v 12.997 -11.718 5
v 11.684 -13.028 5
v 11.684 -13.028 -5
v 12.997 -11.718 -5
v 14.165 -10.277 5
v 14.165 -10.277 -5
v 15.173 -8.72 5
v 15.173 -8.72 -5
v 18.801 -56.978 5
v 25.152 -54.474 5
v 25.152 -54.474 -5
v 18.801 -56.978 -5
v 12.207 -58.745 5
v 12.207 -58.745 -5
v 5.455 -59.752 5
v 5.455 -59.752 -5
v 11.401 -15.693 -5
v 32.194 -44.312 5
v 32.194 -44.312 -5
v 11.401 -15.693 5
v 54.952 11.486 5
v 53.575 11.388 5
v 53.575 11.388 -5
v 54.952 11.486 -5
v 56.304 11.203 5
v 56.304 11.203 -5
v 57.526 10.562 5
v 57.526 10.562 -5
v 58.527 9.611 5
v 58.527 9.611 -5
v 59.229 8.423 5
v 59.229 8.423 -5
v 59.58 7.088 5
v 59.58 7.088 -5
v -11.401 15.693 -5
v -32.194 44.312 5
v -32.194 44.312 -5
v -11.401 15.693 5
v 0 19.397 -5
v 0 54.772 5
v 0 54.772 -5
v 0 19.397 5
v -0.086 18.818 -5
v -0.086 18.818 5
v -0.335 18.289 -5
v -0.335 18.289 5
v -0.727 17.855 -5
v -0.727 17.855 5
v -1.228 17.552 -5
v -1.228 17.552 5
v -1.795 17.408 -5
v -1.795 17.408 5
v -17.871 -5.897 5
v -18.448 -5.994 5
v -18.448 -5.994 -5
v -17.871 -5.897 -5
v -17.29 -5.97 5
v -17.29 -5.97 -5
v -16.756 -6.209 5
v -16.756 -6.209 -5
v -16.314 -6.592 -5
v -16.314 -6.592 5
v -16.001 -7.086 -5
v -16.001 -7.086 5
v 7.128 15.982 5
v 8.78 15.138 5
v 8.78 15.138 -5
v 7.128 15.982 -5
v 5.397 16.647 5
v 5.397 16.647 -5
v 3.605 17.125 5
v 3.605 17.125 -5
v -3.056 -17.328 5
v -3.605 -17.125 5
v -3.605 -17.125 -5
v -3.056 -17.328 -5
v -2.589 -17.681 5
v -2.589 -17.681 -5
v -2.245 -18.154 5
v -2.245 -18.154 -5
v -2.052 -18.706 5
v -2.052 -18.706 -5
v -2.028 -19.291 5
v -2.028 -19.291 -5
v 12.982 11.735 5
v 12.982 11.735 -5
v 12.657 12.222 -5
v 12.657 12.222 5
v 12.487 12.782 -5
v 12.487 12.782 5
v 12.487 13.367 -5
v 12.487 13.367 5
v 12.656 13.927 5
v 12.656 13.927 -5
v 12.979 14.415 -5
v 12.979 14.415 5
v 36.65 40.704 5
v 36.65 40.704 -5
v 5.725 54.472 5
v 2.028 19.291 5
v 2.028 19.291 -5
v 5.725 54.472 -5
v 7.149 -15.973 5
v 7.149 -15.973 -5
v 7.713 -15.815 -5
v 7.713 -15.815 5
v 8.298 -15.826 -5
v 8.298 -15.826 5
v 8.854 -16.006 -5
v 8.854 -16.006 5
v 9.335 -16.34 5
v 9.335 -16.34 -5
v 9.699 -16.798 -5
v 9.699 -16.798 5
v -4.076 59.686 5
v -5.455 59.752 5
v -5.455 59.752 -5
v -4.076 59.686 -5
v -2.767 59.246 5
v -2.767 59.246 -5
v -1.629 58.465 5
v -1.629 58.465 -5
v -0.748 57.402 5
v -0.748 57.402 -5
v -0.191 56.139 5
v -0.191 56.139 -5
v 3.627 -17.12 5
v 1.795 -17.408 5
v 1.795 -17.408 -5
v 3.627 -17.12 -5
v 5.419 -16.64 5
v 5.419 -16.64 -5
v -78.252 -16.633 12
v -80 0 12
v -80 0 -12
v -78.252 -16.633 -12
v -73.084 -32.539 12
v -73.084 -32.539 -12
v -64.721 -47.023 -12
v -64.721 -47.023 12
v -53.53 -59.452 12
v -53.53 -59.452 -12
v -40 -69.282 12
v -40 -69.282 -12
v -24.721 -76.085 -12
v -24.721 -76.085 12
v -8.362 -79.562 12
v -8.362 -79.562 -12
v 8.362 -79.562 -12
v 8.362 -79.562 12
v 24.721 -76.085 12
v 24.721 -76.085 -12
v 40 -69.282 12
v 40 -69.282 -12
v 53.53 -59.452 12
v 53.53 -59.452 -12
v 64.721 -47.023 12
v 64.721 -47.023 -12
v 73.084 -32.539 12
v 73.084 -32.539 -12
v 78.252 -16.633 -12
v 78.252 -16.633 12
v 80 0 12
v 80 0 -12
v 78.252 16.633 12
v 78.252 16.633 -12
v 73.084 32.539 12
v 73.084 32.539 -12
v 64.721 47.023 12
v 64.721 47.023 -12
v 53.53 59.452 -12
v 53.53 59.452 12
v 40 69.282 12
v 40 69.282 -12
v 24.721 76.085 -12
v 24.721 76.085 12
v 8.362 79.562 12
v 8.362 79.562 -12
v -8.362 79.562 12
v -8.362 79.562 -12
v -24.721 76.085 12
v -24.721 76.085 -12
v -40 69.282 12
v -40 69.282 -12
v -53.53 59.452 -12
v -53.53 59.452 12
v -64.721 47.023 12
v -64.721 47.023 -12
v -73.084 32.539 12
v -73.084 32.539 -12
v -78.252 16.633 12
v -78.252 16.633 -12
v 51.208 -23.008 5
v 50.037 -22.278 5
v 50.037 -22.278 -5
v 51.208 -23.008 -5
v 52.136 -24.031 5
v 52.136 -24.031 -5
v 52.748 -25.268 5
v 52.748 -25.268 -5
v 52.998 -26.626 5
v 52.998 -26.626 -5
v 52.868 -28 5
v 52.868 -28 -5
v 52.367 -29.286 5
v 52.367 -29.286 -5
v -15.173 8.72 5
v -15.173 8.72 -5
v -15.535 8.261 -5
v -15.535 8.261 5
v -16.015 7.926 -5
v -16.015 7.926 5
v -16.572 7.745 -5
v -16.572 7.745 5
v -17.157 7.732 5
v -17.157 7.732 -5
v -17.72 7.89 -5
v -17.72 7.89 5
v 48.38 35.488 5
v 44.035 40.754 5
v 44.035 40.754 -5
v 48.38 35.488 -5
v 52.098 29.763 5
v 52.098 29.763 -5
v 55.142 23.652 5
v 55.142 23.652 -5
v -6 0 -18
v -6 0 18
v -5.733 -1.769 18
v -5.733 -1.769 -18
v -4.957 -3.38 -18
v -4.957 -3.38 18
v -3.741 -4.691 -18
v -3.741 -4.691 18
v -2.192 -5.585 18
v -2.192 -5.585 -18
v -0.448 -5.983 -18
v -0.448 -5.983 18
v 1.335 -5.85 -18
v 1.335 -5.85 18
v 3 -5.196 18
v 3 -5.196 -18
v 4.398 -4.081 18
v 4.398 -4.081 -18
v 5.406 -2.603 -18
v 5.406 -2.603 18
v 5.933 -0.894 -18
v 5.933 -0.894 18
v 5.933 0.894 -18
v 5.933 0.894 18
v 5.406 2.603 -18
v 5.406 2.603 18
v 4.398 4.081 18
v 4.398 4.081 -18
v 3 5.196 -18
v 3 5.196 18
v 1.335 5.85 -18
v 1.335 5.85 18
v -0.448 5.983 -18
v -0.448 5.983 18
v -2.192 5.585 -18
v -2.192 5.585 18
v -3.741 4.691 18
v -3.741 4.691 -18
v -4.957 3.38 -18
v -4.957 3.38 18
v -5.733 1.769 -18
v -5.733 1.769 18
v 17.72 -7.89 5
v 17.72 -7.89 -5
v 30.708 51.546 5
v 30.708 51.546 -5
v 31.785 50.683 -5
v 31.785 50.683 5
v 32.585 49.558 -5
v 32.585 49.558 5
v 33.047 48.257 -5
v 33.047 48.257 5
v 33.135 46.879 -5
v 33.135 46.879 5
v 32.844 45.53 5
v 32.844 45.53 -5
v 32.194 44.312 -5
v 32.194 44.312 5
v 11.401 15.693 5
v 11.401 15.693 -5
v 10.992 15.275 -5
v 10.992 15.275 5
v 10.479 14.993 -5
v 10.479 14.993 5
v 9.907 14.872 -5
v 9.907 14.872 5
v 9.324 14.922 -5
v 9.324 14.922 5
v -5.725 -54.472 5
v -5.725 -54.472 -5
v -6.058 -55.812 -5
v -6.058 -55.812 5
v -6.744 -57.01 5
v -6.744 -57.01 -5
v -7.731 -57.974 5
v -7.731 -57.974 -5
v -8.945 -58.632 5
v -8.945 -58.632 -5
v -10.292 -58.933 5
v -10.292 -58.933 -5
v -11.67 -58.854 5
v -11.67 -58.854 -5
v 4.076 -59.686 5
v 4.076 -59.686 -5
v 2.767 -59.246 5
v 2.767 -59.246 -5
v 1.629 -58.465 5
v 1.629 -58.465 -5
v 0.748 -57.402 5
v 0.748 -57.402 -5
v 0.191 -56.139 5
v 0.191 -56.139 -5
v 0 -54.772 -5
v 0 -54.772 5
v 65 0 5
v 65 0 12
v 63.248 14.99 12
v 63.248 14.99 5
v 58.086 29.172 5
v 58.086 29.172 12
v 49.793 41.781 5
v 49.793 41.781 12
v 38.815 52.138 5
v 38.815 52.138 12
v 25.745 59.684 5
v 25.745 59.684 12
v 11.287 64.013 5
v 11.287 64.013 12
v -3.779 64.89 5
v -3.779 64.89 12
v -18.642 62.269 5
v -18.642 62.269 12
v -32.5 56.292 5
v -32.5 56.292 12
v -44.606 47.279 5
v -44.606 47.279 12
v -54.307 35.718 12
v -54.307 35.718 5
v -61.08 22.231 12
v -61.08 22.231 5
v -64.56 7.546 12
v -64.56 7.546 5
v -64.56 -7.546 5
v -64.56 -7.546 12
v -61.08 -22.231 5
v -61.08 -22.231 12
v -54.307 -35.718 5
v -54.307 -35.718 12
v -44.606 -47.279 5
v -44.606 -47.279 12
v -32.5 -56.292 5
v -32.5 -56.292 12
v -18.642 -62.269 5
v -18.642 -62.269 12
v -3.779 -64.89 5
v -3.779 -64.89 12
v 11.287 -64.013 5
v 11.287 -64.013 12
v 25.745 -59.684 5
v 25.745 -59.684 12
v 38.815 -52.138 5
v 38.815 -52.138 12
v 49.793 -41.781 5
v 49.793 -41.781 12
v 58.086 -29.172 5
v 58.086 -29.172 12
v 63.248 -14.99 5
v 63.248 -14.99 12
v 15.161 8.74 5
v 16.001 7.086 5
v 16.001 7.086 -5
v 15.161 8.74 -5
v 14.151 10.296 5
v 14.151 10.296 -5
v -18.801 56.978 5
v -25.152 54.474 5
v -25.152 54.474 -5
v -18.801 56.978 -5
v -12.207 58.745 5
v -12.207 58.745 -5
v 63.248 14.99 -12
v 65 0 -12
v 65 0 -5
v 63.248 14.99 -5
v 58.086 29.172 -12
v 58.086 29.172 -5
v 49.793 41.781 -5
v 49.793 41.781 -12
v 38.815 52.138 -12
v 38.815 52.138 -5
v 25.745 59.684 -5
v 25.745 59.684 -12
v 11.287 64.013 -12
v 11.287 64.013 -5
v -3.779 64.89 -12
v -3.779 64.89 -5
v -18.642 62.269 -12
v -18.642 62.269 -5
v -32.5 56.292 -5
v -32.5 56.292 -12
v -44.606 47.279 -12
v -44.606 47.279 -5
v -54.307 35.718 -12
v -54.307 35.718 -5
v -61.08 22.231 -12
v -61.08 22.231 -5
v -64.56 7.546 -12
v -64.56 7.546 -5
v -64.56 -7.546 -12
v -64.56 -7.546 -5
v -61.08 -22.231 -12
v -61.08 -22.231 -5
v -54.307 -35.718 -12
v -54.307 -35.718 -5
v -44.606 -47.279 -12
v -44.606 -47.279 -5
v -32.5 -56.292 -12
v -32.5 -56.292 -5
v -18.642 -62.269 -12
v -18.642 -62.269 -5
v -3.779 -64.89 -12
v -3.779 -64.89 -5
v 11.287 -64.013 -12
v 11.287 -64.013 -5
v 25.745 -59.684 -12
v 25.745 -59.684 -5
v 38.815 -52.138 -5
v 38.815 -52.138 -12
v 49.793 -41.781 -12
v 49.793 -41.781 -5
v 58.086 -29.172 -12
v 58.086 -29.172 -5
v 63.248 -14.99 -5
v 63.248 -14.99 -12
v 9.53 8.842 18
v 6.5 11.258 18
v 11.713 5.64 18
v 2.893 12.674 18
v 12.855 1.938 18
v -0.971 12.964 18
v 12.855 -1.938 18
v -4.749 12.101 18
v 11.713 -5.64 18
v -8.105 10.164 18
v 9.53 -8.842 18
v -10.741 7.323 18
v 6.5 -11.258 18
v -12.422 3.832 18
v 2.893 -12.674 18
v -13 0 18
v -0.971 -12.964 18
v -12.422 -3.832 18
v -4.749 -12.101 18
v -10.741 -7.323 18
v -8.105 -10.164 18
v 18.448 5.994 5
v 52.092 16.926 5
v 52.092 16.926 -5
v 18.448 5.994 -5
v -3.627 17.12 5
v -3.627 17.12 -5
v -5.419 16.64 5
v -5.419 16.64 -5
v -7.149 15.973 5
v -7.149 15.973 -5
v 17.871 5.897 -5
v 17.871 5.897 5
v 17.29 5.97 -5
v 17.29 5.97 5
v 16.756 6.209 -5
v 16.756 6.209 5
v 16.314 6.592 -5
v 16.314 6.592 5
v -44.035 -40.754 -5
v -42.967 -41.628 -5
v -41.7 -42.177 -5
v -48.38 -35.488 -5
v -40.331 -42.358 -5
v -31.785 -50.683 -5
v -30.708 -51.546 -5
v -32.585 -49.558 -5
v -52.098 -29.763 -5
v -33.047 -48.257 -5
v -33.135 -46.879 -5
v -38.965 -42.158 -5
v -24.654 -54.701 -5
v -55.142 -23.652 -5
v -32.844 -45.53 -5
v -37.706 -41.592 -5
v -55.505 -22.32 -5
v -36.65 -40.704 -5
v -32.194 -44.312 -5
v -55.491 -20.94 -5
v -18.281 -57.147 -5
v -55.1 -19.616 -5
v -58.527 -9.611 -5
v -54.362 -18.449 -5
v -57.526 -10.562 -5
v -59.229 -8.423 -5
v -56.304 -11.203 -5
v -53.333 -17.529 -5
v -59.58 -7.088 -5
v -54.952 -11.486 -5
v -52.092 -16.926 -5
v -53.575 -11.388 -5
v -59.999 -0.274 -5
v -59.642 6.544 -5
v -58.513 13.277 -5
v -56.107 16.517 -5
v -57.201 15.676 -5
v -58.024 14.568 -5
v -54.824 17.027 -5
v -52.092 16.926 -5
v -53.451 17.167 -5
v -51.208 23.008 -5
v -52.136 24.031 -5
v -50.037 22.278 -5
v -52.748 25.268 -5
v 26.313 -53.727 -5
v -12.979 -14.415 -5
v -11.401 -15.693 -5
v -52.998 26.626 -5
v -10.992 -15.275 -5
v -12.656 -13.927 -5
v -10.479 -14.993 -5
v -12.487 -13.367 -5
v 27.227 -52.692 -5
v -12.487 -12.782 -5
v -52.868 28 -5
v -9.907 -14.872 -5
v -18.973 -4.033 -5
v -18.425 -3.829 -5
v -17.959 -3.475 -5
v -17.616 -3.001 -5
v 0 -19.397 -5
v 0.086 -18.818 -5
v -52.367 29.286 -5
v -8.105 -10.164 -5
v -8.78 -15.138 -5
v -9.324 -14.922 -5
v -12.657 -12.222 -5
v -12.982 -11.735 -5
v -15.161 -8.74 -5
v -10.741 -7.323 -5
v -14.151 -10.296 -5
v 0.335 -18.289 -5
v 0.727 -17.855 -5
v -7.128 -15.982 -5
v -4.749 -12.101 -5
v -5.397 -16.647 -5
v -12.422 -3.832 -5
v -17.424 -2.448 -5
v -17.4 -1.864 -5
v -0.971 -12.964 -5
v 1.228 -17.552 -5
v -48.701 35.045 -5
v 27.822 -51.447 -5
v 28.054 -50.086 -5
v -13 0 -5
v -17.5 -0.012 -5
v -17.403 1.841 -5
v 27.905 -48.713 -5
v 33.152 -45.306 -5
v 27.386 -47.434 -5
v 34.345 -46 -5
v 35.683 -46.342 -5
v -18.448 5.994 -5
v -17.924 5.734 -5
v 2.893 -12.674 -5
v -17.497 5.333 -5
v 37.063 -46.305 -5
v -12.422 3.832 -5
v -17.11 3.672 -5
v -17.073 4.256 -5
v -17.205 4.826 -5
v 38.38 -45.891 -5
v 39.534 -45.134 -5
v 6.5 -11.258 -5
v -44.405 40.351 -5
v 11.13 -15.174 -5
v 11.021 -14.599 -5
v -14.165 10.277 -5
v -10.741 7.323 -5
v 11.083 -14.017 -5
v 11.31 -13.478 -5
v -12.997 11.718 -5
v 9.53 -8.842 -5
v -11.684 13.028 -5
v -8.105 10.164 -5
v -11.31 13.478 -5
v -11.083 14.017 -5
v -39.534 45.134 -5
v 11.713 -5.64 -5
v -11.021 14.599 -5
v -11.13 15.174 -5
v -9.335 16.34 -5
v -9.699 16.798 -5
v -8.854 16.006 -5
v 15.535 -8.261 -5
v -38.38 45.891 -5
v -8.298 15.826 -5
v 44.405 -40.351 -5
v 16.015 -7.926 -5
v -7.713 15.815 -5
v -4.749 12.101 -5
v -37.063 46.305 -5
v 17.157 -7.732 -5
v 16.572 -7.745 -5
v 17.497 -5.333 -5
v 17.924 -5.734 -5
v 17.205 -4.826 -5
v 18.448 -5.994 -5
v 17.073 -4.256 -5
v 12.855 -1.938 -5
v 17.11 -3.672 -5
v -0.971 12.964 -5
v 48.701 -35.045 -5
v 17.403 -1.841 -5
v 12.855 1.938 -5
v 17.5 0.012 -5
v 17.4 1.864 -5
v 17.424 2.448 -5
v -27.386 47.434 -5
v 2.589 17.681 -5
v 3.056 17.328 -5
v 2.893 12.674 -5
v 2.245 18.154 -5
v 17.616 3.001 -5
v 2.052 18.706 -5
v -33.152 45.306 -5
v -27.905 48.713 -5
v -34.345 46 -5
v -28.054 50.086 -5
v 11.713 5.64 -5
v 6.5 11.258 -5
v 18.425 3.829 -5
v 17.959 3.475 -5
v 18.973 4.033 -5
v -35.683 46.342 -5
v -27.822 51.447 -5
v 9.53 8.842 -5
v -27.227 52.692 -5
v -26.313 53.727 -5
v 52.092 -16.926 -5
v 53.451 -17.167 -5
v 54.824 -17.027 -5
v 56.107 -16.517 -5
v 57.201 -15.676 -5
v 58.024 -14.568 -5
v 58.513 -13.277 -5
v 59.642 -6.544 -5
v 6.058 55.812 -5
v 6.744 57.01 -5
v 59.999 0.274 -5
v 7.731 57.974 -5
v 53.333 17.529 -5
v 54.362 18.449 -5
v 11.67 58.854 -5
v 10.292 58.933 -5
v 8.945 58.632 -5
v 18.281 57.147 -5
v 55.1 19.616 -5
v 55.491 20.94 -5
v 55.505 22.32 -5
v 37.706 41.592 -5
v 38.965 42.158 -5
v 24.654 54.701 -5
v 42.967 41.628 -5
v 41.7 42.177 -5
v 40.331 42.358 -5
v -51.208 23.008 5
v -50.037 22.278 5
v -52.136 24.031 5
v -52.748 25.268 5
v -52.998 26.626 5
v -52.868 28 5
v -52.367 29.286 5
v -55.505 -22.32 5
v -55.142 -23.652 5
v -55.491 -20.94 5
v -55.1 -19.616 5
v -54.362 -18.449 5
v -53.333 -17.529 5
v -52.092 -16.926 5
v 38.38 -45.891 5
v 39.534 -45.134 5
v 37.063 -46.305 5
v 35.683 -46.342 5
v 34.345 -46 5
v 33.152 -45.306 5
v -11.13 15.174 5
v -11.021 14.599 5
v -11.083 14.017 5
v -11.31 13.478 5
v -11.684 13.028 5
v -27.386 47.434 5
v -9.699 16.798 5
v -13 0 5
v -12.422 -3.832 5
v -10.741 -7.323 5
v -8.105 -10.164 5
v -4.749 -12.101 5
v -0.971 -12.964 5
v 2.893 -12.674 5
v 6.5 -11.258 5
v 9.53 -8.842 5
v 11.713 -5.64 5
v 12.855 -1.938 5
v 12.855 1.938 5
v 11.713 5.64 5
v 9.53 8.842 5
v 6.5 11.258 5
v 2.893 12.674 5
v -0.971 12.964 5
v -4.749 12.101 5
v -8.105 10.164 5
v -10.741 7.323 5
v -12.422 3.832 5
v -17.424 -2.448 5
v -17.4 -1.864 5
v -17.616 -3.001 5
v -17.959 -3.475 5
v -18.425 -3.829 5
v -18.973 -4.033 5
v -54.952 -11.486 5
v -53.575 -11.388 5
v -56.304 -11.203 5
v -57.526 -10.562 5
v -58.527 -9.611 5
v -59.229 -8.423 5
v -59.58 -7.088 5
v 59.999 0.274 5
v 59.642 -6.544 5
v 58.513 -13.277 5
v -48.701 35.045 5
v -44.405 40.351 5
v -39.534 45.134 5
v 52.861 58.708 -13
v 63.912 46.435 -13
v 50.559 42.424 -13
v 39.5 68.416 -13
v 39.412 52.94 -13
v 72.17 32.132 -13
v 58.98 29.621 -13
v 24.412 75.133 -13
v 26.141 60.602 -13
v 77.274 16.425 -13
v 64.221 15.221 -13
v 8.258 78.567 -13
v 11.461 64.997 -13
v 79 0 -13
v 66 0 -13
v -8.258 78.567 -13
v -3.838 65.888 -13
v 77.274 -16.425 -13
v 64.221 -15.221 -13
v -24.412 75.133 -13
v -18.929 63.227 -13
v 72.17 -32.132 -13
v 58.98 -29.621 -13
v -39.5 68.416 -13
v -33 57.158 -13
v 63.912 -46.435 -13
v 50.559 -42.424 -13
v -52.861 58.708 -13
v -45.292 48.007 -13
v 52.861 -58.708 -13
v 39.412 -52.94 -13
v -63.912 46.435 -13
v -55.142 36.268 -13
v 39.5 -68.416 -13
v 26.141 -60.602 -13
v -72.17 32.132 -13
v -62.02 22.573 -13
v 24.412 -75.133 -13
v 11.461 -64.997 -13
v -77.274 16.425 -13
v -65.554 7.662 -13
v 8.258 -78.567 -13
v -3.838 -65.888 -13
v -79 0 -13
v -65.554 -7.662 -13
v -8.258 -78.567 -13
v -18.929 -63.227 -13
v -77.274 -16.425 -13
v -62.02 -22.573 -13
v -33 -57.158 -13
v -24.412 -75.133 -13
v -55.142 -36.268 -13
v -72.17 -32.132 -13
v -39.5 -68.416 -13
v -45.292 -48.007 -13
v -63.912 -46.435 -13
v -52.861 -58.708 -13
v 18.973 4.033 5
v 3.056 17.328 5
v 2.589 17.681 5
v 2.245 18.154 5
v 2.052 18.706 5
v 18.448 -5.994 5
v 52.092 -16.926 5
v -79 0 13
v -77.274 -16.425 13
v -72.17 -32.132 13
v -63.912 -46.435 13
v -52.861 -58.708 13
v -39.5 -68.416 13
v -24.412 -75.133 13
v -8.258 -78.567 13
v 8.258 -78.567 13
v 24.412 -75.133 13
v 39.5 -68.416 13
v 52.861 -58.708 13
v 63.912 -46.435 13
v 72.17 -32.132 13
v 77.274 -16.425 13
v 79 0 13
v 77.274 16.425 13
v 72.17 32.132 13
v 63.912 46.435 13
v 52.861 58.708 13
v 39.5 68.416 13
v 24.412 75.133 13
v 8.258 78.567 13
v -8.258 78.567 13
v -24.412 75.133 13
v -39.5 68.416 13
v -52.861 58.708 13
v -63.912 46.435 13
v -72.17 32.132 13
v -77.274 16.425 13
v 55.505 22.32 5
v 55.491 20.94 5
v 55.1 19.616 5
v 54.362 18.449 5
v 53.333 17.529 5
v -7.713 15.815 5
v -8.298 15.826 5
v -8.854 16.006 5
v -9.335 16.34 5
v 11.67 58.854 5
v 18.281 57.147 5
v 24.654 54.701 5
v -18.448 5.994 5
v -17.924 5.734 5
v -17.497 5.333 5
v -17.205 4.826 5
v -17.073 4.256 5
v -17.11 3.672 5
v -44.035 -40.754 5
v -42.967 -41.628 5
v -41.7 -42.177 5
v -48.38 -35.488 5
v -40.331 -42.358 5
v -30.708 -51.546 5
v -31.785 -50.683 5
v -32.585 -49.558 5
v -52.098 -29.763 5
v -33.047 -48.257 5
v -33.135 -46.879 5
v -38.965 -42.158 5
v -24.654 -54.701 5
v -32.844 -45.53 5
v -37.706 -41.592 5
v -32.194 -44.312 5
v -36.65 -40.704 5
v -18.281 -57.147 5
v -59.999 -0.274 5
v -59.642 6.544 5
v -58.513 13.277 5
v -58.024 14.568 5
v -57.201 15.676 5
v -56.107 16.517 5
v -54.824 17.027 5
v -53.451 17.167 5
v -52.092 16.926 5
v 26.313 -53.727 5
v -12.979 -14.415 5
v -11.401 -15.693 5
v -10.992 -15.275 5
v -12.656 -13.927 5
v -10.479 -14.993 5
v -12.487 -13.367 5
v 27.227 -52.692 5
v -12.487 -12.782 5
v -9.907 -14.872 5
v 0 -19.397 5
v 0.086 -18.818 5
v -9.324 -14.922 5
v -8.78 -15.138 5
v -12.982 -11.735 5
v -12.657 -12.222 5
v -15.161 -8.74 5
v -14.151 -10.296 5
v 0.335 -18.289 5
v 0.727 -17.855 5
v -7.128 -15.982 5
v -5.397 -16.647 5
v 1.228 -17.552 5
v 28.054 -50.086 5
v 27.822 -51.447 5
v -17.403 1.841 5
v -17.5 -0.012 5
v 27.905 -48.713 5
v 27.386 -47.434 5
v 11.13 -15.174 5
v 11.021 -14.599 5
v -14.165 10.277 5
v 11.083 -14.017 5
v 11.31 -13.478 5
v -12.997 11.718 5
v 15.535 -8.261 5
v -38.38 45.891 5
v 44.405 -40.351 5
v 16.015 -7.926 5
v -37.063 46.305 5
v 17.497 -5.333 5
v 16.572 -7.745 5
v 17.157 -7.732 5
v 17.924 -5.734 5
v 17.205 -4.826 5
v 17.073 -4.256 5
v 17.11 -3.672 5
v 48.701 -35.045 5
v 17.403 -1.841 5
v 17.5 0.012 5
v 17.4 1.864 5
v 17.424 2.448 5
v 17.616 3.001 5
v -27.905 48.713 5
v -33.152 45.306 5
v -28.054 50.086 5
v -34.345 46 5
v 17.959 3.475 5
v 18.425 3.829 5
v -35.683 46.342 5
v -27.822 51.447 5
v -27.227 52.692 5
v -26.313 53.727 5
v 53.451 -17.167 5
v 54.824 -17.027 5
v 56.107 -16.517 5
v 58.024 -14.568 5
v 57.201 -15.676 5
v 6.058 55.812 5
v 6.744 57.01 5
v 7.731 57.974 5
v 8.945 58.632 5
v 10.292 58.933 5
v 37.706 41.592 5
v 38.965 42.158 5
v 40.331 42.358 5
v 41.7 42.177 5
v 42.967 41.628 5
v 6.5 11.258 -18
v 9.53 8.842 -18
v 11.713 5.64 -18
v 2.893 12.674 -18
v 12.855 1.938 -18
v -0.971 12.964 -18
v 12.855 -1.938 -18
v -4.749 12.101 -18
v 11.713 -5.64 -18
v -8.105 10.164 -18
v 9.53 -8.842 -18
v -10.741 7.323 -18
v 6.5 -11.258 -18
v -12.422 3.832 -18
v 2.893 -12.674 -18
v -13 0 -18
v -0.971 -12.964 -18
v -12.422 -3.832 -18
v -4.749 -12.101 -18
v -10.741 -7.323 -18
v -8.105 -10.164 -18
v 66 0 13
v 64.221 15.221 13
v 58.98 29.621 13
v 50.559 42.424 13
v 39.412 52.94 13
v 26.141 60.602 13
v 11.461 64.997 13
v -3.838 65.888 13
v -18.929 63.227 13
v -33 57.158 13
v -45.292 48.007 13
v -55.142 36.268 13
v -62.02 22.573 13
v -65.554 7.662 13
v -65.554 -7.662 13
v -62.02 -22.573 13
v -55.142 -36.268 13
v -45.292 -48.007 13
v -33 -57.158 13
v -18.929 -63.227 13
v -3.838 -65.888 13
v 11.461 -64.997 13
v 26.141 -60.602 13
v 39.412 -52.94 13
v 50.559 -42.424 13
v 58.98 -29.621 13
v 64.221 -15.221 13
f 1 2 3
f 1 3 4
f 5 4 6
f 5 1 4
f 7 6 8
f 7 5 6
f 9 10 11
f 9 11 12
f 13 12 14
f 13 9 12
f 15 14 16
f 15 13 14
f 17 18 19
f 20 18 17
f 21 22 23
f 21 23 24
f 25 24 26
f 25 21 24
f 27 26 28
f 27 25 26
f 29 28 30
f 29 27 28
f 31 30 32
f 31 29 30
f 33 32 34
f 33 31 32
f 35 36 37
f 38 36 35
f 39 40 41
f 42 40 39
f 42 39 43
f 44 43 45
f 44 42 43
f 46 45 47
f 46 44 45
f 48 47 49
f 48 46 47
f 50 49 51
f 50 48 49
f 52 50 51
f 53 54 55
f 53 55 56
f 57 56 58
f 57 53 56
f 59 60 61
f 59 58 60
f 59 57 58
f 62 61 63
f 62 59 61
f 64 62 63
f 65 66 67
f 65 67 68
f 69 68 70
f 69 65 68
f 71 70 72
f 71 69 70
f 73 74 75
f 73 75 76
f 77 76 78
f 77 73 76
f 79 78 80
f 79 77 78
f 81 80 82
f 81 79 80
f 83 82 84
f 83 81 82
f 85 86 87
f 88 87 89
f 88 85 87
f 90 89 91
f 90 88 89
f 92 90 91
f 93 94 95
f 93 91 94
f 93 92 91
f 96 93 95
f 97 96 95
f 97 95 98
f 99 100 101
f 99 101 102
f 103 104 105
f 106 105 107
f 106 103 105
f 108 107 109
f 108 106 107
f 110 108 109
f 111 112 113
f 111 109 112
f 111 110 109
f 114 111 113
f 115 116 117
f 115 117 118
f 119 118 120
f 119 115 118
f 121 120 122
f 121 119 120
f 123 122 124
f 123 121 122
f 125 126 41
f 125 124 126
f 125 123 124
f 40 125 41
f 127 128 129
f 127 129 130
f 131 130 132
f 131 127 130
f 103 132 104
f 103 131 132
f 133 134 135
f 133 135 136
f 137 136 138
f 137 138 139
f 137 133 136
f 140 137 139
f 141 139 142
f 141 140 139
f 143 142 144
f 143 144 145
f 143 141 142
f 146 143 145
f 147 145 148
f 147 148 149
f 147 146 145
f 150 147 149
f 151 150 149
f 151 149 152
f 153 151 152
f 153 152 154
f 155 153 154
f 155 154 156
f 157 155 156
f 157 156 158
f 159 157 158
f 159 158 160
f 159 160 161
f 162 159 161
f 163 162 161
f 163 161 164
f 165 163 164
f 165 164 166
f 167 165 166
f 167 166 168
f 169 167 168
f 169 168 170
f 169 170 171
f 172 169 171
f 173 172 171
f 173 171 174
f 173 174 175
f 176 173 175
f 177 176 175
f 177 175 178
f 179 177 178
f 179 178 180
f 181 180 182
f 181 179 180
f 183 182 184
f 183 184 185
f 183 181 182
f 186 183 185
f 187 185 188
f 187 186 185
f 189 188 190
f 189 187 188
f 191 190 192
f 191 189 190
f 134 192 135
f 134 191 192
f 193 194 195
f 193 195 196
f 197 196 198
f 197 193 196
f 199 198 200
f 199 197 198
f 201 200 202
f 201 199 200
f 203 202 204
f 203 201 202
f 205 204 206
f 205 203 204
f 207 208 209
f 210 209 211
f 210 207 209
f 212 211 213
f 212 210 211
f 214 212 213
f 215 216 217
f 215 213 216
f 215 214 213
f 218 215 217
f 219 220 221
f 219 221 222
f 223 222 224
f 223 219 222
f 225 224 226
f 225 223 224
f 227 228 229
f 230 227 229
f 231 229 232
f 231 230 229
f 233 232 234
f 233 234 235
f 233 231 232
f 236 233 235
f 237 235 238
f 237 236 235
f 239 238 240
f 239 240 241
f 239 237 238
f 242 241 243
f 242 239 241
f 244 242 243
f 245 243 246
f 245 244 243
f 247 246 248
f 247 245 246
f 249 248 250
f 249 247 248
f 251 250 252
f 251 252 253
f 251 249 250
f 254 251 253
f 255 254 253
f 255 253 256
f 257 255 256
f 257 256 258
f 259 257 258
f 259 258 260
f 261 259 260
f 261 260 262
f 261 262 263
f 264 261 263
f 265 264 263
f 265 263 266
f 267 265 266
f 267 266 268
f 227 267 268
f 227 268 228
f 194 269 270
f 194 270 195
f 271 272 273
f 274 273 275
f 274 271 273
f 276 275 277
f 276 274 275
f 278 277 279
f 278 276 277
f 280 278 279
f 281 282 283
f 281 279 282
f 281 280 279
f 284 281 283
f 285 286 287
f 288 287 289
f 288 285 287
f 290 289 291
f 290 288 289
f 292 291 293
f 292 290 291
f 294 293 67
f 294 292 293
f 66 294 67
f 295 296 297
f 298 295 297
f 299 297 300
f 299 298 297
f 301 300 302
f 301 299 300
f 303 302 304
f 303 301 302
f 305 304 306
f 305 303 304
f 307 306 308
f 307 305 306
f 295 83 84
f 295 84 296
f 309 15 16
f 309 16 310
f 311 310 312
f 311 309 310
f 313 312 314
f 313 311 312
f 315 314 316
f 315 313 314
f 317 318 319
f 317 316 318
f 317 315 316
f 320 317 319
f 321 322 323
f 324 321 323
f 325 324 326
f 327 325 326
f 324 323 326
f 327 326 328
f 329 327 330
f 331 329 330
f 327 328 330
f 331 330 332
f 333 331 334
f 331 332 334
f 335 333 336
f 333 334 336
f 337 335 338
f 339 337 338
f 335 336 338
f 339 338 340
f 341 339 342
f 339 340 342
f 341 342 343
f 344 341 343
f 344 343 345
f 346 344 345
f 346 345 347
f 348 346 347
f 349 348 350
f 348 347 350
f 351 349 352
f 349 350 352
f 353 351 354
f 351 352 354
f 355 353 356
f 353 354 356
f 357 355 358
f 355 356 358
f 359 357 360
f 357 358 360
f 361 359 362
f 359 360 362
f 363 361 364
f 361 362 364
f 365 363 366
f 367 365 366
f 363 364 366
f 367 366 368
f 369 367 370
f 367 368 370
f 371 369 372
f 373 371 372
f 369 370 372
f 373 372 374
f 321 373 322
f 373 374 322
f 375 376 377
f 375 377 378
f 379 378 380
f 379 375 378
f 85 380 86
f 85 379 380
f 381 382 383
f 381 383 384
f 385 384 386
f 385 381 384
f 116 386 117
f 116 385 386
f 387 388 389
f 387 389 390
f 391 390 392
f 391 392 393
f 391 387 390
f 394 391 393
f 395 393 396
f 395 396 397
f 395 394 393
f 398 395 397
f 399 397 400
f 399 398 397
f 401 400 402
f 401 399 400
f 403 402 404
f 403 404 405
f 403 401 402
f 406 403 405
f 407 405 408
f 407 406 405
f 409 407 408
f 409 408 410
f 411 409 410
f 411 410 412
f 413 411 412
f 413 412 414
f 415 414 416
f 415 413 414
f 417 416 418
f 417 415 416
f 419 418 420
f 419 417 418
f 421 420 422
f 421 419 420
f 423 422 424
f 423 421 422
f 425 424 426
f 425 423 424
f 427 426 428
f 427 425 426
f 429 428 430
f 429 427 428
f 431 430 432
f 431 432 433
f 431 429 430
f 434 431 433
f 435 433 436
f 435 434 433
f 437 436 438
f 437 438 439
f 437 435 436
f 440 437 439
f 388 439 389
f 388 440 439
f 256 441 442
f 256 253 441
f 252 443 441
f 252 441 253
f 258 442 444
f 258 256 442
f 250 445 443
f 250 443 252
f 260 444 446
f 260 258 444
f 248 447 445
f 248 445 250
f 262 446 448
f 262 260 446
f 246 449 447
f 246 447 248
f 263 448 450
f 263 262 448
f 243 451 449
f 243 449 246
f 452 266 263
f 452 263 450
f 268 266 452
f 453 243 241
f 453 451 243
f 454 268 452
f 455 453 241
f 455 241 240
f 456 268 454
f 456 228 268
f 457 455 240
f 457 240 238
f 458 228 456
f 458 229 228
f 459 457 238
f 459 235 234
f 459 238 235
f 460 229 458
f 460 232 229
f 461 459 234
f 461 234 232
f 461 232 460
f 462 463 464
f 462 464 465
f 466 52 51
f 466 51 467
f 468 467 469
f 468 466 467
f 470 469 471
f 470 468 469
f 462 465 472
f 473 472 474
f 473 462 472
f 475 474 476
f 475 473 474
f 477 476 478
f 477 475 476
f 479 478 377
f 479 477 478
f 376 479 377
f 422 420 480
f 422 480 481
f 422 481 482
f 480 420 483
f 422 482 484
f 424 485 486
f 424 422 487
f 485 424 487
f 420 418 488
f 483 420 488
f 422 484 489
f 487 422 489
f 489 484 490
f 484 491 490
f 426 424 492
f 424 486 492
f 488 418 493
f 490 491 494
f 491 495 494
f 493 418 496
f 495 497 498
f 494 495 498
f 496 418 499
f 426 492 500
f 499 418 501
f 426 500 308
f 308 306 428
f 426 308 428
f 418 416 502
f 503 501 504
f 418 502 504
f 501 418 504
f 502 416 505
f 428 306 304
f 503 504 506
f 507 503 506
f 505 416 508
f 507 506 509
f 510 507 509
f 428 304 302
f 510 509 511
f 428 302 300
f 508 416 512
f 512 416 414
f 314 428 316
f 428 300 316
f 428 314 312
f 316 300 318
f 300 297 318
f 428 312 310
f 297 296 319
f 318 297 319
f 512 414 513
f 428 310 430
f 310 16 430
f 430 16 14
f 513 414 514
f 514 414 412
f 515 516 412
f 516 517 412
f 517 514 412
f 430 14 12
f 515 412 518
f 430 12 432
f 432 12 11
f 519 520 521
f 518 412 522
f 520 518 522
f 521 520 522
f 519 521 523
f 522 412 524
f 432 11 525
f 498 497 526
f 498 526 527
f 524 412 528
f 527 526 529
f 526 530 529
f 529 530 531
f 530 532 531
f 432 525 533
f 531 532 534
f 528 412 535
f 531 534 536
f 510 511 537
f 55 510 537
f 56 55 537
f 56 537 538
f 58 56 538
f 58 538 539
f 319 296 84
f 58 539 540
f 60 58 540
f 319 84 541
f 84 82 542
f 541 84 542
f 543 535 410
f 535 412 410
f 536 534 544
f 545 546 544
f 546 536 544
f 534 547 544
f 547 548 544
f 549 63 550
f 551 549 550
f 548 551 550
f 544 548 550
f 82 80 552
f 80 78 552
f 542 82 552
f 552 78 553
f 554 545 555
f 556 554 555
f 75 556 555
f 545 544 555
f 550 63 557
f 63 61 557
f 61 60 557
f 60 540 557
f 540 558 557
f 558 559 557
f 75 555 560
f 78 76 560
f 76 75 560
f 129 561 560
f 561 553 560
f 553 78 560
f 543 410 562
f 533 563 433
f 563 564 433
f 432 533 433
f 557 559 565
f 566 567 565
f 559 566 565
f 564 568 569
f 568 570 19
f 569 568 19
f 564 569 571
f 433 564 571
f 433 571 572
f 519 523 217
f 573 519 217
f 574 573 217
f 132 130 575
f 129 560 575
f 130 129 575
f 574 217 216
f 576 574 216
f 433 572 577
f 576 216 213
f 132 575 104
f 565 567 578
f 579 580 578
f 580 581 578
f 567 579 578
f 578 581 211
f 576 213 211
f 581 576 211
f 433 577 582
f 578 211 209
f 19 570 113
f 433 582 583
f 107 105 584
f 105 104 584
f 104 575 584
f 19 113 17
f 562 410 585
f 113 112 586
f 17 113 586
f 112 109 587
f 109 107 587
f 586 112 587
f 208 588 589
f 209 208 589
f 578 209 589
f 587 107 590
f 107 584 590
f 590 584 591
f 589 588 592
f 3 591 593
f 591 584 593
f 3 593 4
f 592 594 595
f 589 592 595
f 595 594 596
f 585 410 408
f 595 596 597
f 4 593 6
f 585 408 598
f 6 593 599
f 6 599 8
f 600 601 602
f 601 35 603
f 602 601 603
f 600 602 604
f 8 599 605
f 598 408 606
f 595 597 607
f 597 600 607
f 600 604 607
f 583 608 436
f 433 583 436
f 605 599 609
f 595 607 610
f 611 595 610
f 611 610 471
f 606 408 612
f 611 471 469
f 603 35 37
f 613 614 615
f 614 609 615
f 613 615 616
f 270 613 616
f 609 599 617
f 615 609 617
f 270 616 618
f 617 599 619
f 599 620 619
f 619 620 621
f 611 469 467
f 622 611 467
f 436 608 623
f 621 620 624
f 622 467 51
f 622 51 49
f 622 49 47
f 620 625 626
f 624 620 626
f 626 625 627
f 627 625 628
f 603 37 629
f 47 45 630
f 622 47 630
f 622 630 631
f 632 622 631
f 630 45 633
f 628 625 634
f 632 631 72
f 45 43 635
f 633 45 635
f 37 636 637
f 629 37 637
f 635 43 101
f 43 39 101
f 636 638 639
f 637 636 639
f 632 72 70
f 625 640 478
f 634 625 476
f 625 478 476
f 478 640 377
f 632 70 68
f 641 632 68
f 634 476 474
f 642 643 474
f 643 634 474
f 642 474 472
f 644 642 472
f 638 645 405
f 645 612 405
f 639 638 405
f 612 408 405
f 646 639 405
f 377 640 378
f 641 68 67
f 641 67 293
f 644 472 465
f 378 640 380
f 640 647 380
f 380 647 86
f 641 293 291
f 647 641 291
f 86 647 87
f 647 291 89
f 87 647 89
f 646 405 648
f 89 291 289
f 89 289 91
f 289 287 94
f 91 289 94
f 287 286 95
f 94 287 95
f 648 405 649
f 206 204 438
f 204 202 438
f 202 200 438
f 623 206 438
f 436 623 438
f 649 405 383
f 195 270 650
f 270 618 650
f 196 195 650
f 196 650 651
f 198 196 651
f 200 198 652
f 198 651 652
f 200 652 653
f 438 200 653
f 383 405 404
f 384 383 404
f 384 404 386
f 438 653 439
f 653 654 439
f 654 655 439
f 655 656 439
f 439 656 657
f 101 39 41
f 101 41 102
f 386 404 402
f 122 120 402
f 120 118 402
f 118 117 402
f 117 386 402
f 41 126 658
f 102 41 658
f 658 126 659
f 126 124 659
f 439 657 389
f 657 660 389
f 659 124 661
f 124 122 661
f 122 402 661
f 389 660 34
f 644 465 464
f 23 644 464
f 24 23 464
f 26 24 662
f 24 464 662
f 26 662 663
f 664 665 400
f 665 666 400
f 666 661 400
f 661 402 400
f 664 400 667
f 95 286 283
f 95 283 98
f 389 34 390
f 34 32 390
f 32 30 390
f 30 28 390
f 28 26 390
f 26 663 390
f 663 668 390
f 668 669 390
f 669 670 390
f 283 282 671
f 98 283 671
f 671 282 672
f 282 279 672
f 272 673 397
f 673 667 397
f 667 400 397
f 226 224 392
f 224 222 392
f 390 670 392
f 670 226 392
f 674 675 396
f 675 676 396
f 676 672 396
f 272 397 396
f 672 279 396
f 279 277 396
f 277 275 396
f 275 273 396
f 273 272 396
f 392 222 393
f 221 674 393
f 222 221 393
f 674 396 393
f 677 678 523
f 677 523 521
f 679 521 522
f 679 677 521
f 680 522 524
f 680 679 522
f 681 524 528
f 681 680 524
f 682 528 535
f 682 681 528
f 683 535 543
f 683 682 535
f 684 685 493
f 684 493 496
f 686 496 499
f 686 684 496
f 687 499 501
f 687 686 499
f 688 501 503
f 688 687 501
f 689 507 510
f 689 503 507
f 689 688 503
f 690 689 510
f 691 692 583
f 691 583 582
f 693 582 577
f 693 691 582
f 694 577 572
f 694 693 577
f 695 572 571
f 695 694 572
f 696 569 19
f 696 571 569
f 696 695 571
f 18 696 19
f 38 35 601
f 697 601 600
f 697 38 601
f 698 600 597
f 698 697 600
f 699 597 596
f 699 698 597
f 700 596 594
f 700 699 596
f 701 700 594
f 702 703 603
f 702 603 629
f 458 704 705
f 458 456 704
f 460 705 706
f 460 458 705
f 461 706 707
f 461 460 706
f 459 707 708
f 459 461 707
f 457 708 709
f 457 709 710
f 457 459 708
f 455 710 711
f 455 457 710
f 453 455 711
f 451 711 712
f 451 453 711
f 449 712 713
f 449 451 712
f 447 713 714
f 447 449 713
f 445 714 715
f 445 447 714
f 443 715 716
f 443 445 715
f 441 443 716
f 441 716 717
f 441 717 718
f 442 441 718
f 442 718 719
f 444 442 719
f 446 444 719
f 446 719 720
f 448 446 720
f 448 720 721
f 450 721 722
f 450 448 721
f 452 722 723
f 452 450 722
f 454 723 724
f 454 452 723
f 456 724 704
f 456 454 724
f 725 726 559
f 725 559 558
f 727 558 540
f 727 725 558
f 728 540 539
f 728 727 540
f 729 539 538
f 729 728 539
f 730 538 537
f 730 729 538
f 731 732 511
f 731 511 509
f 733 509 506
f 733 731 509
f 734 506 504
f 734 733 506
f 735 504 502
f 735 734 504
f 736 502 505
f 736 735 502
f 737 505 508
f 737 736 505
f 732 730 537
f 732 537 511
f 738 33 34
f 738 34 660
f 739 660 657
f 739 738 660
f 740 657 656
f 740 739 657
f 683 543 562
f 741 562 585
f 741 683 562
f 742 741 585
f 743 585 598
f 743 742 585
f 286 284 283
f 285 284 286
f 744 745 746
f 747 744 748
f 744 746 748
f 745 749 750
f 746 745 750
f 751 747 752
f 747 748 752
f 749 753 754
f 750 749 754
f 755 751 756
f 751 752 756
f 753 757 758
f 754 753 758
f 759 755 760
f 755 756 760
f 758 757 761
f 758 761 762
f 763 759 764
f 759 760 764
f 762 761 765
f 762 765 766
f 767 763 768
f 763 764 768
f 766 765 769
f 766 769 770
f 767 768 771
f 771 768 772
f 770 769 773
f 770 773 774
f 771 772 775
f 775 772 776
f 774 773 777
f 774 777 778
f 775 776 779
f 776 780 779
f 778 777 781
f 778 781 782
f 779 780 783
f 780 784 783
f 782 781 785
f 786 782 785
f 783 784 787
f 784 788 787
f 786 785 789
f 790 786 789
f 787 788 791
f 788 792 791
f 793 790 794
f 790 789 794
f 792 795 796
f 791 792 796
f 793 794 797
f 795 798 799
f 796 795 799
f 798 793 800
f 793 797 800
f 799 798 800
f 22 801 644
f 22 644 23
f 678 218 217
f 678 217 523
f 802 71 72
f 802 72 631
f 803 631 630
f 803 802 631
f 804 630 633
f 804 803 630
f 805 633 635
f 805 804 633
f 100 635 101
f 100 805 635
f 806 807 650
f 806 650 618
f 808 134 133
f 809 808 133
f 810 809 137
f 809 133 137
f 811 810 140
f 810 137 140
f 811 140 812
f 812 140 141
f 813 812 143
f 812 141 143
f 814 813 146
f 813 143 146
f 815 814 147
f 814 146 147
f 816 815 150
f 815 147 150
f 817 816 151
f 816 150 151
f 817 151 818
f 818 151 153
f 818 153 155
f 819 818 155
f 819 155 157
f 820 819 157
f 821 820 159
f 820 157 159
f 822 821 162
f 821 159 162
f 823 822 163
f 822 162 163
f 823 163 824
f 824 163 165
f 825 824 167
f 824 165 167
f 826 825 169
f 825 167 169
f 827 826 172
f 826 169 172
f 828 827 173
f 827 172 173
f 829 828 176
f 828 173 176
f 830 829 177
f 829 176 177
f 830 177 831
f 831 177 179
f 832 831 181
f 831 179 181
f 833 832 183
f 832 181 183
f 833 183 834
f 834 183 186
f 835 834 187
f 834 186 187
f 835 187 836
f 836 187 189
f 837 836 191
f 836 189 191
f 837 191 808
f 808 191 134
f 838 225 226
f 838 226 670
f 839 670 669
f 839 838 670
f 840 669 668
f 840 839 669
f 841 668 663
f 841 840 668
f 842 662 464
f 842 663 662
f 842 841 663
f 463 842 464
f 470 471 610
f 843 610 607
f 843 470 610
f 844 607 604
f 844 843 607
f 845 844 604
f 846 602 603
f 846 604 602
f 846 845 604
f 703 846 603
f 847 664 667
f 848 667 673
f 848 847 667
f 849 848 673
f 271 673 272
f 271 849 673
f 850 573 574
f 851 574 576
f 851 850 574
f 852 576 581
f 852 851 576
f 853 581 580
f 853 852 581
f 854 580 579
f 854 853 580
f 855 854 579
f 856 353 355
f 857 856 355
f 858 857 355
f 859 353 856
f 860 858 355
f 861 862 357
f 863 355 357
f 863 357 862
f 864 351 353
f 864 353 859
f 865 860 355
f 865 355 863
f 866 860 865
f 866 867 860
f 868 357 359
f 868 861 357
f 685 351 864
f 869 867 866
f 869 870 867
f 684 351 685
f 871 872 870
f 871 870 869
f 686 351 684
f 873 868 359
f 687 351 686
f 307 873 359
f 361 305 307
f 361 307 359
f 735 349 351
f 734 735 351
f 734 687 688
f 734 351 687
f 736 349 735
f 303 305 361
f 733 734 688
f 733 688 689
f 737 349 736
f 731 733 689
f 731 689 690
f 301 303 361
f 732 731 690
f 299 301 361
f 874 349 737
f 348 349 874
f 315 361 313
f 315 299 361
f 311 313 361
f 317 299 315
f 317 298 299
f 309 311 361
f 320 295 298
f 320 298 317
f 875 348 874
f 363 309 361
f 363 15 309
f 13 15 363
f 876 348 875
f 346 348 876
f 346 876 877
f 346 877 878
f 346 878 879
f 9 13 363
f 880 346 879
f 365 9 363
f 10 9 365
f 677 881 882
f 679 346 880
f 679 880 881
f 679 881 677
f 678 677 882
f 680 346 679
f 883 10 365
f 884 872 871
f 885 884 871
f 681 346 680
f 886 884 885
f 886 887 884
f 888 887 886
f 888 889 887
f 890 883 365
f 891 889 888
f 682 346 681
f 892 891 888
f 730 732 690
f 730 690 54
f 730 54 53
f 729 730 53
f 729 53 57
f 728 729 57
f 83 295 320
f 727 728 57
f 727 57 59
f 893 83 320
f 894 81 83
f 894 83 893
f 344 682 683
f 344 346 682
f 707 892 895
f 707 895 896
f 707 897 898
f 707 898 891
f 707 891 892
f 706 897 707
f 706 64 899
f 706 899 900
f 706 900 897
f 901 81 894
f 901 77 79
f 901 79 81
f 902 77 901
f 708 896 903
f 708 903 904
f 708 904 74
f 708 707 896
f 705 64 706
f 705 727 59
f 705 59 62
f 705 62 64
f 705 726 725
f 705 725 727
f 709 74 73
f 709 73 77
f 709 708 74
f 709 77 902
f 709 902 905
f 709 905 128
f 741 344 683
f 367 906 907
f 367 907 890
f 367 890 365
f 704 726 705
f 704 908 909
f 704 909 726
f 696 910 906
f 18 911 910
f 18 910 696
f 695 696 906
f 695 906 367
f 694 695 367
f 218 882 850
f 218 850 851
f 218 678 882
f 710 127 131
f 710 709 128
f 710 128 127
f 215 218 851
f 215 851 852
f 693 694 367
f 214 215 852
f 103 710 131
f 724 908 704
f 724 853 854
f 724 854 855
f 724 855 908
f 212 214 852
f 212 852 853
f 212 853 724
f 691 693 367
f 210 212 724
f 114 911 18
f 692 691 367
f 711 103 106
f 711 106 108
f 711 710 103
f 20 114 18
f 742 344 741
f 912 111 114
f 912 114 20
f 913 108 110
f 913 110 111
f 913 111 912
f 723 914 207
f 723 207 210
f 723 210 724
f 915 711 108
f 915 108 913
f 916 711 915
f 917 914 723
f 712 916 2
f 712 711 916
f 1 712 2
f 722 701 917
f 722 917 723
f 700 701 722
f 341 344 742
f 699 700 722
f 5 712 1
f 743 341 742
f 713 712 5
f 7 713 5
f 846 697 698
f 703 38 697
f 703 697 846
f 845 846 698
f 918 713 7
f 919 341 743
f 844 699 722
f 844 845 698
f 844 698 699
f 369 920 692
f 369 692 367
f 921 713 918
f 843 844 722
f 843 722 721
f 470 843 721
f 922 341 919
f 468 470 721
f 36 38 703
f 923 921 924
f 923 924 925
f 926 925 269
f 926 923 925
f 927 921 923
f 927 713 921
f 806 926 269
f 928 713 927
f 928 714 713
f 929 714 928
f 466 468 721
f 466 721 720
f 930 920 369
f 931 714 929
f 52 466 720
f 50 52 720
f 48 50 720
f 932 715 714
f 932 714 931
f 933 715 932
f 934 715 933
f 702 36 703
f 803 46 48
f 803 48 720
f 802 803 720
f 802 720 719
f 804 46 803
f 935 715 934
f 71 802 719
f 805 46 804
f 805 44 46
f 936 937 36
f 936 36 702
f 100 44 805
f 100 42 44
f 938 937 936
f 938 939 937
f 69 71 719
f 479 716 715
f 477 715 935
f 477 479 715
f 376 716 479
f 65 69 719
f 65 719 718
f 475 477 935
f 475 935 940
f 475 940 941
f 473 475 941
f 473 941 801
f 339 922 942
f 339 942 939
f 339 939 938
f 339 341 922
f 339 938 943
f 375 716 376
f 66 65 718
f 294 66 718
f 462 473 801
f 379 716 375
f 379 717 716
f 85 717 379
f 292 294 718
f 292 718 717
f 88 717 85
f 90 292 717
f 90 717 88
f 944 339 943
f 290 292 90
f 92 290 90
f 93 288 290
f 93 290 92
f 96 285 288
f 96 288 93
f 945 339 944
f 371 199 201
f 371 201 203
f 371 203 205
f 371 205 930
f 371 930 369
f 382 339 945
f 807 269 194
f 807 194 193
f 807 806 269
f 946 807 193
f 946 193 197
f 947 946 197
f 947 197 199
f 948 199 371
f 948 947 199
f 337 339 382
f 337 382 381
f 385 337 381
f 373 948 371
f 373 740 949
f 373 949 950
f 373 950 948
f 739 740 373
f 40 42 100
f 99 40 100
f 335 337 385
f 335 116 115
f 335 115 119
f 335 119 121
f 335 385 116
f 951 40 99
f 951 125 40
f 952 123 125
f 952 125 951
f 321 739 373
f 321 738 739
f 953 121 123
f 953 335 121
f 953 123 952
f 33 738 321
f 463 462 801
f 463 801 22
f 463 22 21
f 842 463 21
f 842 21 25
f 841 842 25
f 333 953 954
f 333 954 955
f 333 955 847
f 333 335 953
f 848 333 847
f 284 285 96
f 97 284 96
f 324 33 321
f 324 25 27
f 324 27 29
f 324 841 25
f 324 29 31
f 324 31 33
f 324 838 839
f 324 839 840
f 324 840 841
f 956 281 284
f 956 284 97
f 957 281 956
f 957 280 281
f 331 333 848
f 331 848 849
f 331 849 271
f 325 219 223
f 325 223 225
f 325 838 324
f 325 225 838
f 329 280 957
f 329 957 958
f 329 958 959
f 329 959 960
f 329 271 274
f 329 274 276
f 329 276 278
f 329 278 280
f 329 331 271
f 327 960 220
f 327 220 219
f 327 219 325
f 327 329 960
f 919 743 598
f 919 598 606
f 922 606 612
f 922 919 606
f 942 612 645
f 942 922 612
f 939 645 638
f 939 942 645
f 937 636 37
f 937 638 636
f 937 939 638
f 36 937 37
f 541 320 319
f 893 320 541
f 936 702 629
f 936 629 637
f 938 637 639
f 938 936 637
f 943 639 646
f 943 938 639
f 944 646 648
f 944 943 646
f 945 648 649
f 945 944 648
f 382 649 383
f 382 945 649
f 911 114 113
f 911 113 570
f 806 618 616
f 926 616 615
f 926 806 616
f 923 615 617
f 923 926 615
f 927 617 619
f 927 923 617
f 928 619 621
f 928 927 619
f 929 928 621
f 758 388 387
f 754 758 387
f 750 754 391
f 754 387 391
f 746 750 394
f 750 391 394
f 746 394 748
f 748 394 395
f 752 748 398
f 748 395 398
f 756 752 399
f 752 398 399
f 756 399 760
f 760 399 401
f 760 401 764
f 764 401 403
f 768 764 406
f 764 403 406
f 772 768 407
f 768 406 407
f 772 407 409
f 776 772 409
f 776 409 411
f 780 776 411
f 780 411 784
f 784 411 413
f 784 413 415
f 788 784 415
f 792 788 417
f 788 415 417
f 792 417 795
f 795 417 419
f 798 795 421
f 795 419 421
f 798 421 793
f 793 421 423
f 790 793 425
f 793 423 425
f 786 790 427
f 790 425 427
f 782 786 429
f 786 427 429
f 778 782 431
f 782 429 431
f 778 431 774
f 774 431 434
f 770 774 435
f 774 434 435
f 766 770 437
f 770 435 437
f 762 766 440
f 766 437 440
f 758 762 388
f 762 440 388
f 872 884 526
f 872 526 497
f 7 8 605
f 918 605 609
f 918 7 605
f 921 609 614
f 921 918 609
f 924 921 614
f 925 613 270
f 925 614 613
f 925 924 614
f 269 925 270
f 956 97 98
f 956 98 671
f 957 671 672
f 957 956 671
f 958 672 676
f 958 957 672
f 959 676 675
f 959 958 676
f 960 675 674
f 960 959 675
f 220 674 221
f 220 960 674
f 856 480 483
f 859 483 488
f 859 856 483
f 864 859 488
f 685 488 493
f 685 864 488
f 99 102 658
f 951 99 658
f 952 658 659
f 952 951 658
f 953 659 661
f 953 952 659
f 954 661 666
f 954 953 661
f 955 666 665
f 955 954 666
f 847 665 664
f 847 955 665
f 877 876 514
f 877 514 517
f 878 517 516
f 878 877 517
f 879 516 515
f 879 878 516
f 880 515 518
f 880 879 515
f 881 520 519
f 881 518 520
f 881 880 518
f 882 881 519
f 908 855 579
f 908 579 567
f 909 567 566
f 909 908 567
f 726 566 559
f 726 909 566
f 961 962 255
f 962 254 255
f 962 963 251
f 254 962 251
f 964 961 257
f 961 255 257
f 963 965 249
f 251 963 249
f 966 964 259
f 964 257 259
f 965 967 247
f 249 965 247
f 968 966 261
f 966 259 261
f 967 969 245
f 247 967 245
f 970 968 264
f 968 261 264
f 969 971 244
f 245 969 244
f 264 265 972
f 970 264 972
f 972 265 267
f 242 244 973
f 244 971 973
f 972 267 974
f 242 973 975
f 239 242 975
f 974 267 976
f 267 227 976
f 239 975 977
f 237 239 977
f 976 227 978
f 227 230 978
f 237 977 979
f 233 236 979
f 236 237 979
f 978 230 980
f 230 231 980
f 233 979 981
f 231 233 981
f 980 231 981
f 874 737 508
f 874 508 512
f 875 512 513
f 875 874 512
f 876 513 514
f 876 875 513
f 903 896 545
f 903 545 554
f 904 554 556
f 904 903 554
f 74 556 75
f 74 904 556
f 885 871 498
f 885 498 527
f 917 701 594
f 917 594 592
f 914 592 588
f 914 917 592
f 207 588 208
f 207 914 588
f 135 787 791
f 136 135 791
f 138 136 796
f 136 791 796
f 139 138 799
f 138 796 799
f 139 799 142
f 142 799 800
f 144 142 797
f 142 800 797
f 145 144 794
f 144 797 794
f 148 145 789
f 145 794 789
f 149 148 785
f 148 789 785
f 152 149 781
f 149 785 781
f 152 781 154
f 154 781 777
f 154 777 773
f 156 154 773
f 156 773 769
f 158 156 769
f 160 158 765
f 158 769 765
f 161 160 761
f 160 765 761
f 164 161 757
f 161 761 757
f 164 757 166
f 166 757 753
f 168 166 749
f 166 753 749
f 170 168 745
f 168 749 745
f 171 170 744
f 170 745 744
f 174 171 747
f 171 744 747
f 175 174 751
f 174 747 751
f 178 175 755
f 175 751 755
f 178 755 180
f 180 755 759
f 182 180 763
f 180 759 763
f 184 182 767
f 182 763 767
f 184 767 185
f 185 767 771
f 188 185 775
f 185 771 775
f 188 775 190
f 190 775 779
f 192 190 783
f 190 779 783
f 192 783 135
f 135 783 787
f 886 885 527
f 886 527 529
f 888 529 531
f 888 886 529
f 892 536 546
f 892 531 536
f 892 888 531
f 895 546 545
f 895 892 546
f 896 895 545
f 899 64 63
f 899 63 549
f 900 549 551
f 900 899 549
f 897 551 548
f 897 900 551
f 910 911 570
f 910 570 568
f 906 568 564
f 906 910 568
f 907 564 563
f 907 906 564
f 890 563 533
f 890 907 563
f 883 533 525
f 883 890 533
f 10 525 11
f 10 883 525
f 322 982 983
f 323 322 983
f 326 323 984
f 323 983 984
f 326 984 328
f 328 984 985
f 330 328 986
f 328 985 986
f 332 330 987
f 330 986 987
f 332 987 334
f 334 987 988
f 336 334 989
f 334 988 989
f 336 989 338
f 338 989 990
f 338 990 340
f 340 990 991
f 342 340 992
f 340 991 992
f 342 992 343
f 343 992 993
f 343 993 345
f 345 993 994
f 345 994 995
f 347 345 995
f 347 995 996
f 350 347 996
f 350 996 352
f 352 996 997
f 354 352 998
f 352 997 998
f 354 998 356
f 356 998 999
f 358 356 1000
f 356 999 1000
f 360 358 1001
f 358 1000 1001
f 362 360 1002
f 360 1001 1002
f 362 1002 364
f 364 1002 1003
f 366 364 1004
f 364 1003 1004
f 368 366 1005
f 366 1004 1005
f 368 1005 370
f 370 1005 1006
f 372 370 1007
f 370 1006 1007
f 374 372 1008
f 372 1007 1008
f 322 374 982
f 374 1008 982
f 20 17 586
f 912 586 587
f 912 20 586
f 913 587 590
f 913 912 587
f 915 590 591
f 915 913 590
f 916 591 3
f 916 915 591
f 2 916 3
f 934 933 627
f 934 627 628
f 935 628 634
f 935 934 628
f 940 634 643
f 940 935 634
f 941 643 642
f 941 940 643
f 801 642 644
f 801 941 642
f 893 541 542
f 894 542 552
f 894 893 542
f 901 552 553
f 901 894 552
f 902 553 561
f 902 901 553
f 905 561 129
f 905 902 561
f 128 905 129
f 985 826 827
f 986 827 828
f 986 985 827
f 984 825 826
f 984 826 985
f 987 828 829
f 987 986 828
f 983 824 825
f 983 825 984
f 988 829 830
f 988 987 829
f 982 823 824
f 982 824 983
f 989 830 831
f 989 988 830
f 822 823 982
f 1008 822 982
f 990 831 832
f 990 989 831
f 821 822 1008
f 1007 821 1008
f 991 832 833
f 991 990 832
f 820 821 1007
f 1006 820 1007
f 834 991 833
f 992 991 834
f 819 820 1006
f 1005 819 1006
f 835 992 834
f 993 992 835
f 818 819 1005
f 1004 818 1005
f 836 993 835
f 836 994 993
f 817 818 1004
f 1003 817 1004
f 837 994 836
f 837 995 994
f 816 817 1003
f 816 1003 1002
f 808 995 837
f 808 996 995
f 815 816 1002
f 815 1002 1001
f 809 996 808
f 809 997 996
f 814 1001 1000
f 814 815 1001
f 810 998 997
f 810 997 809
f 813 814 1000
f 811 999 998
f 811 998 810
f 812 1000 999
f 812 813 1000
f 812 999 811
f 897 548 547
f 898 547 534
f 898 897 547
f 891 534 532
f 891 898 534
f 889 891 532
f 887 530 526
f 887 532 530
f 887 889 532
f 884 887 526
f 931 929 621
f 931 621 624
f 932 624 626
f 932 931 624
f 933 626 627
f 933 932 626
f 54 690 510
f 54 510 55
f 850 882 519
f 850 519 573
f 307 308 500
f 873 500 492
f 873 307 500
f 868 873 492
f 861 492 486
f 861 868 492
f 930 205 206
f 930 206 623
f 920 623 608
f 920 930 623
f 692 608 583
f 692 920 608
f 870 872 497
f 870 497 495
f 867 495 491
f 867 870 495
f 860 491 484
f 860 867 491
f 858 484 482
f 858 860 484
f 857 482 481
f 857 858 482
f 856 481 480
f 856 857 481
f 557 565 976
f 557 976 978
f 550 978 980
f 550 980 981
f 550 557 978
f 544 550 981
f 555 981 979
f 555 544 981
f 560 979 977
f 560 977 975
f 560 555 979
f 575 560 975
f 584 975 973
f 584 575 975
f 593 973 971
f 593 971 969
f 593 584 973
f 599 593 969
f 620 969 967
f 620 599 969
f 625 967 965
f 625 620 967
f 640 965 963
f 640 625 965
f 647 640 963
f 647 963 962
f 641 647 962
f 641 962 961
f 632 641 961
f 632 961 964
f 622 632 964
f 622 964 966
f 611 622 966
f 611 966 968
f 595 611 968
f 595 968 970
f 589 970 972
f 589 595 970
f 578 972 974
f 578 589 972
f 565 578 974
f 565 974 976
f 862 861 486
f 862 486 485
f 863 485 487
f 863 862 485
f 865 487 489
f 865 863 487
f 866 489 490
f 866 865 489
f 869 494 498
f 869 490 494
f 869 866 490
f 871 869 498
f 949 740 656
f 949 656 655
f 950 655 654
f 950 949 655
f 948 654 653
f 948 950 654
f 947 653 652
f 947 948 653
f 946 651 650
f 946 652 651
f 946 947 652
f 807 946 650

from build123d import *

# Parameters (mm, degrees)
SKETCH1_R           = 80
SKETCH1_R_2         = 6
BOSS_EXTRUDE1_DEPTH = 13
SKETCH2_R           = 65
CUT_EXTRUDE1_DEPTH  = 8
SKETCH3_R           = 13
SKETCH3_R_2         = 6
BOSS_EXTRUDE2_DEPTH = 18
CHAMFER1_SIZE       = 1
CUT_EXTRUDE2_DEPTH  = 116.451288429
CIRPATTERN1_COUNT   = 10


with BuildPart() as part:
    # Sketch1 → Boss-Extrude1 (new, symmetric)
    with BuildSketch(Plane.XY):
        with Locations(Location((0, 0, 0), (0, 0, 180))):
            Circle(SKETCH1_R)
        with Locations(Location((0, 0, 0), (0, 0, 180))):
            Circle(SKETCH1_R_2, mode=Mode.SUBTRACT)
    extrude(amount=BOSS_EXTRUDE1_DEPTH, both=True)

    # Sketch2 → Cut-Extrude1 (cut)
    with BuildSketch(Plane.XY.offset(13)):
        Circle(SKETCH2_R)
    cut_extrude1 = extrude(amount=-CUT_EXTRUDE1_DEPTH, mode=Mode.SUBTRACT)

    # Mirror1: Cut-Extrude1 across plane
    add(cut_extrude1.mirror(Plane.XY), mode=Mode.SUBTRACT)

    # Sketch3 → Boss-Extrude2 (add, symmetric)
    with BuildSketch(Plane.XY):
        with Locations(Location((0, 0, 0), (0, 0, 180))):
            Circle(SKETCH3_R)
        with Locations(Location((0, 0, 0), (0, 0, 180))):
            Circle(SKETCH3_R_2, mode=Mode.SUBTRACT)
    extrude(amount=BOSS_EXTRUDE2_DEPTH, both=True)

    # Chamfer1
    chamfer1_edges = [part.edges().sort_by_distance(p)[0] for p in [
        (-65, 0, 13),
        (-65, 0, -13),
        (80, 0, -13),
        (80, 0, 13),
    ]]
    chamfer(chamfer1_edges, length=CHAMFER1_SIZE)

    # Sketch7 → Cut-Extrude2 (cut, through all)
    with BuildSketch(Plane.XY.offset(5)):
        with BuildLine():
            Line((0, 54.772255751), (0, 19.397164741))
            ThreePointArc((0, 19.397164741), (-0.515032591, 18.057436487), (-1.794871795, 17.407711947))
            ThreePointArc((-1.794871795, 17.407711947), (-4.529333289, 16.90370196), (-7.149451403, 15.972956666))
            ThreePointArc((-7.149451403, 15.972956666), (-8.582686936, 15.895715021), (-9.698582371, 16.798437427))
            Line((-9.698582371, 16.798437427), (-27.386127875, 47.434164903))
            ThreePointArc((-27.386127875, 47.434164903), (-27.821744262, 51.446675992), (-25.152000934, 54.473634439))
            ThreePointArc((-25.152000934, 54.473634439), (-15.529142706, 57.955549577), (-5.454545455, 59.751551728))
            ThreePointArc((-5.454545455, 59.751551728), (-1.629000688, 58.46500048), (0, 54.772255751))
        make_face()
    cut_extrude2 = extrude(amount=-CUT_EXTRUDE2_DEPTH, mode=Mode.SUBTRACT)

    # CirPattern1: Cut-Extrude2 ×10 about axis
    cirpattern1_axis = Axis((0, 0, 0), (0, 0, 1))
    for i in range(1, CIRPATTERN1_COUNT):
        add(cut_extrude2.rotate(cirpattern1_axis, i * 360 / CIRPATTERN1_COUNT), mode=Mode.SUBTRACT)


solid = part.part
